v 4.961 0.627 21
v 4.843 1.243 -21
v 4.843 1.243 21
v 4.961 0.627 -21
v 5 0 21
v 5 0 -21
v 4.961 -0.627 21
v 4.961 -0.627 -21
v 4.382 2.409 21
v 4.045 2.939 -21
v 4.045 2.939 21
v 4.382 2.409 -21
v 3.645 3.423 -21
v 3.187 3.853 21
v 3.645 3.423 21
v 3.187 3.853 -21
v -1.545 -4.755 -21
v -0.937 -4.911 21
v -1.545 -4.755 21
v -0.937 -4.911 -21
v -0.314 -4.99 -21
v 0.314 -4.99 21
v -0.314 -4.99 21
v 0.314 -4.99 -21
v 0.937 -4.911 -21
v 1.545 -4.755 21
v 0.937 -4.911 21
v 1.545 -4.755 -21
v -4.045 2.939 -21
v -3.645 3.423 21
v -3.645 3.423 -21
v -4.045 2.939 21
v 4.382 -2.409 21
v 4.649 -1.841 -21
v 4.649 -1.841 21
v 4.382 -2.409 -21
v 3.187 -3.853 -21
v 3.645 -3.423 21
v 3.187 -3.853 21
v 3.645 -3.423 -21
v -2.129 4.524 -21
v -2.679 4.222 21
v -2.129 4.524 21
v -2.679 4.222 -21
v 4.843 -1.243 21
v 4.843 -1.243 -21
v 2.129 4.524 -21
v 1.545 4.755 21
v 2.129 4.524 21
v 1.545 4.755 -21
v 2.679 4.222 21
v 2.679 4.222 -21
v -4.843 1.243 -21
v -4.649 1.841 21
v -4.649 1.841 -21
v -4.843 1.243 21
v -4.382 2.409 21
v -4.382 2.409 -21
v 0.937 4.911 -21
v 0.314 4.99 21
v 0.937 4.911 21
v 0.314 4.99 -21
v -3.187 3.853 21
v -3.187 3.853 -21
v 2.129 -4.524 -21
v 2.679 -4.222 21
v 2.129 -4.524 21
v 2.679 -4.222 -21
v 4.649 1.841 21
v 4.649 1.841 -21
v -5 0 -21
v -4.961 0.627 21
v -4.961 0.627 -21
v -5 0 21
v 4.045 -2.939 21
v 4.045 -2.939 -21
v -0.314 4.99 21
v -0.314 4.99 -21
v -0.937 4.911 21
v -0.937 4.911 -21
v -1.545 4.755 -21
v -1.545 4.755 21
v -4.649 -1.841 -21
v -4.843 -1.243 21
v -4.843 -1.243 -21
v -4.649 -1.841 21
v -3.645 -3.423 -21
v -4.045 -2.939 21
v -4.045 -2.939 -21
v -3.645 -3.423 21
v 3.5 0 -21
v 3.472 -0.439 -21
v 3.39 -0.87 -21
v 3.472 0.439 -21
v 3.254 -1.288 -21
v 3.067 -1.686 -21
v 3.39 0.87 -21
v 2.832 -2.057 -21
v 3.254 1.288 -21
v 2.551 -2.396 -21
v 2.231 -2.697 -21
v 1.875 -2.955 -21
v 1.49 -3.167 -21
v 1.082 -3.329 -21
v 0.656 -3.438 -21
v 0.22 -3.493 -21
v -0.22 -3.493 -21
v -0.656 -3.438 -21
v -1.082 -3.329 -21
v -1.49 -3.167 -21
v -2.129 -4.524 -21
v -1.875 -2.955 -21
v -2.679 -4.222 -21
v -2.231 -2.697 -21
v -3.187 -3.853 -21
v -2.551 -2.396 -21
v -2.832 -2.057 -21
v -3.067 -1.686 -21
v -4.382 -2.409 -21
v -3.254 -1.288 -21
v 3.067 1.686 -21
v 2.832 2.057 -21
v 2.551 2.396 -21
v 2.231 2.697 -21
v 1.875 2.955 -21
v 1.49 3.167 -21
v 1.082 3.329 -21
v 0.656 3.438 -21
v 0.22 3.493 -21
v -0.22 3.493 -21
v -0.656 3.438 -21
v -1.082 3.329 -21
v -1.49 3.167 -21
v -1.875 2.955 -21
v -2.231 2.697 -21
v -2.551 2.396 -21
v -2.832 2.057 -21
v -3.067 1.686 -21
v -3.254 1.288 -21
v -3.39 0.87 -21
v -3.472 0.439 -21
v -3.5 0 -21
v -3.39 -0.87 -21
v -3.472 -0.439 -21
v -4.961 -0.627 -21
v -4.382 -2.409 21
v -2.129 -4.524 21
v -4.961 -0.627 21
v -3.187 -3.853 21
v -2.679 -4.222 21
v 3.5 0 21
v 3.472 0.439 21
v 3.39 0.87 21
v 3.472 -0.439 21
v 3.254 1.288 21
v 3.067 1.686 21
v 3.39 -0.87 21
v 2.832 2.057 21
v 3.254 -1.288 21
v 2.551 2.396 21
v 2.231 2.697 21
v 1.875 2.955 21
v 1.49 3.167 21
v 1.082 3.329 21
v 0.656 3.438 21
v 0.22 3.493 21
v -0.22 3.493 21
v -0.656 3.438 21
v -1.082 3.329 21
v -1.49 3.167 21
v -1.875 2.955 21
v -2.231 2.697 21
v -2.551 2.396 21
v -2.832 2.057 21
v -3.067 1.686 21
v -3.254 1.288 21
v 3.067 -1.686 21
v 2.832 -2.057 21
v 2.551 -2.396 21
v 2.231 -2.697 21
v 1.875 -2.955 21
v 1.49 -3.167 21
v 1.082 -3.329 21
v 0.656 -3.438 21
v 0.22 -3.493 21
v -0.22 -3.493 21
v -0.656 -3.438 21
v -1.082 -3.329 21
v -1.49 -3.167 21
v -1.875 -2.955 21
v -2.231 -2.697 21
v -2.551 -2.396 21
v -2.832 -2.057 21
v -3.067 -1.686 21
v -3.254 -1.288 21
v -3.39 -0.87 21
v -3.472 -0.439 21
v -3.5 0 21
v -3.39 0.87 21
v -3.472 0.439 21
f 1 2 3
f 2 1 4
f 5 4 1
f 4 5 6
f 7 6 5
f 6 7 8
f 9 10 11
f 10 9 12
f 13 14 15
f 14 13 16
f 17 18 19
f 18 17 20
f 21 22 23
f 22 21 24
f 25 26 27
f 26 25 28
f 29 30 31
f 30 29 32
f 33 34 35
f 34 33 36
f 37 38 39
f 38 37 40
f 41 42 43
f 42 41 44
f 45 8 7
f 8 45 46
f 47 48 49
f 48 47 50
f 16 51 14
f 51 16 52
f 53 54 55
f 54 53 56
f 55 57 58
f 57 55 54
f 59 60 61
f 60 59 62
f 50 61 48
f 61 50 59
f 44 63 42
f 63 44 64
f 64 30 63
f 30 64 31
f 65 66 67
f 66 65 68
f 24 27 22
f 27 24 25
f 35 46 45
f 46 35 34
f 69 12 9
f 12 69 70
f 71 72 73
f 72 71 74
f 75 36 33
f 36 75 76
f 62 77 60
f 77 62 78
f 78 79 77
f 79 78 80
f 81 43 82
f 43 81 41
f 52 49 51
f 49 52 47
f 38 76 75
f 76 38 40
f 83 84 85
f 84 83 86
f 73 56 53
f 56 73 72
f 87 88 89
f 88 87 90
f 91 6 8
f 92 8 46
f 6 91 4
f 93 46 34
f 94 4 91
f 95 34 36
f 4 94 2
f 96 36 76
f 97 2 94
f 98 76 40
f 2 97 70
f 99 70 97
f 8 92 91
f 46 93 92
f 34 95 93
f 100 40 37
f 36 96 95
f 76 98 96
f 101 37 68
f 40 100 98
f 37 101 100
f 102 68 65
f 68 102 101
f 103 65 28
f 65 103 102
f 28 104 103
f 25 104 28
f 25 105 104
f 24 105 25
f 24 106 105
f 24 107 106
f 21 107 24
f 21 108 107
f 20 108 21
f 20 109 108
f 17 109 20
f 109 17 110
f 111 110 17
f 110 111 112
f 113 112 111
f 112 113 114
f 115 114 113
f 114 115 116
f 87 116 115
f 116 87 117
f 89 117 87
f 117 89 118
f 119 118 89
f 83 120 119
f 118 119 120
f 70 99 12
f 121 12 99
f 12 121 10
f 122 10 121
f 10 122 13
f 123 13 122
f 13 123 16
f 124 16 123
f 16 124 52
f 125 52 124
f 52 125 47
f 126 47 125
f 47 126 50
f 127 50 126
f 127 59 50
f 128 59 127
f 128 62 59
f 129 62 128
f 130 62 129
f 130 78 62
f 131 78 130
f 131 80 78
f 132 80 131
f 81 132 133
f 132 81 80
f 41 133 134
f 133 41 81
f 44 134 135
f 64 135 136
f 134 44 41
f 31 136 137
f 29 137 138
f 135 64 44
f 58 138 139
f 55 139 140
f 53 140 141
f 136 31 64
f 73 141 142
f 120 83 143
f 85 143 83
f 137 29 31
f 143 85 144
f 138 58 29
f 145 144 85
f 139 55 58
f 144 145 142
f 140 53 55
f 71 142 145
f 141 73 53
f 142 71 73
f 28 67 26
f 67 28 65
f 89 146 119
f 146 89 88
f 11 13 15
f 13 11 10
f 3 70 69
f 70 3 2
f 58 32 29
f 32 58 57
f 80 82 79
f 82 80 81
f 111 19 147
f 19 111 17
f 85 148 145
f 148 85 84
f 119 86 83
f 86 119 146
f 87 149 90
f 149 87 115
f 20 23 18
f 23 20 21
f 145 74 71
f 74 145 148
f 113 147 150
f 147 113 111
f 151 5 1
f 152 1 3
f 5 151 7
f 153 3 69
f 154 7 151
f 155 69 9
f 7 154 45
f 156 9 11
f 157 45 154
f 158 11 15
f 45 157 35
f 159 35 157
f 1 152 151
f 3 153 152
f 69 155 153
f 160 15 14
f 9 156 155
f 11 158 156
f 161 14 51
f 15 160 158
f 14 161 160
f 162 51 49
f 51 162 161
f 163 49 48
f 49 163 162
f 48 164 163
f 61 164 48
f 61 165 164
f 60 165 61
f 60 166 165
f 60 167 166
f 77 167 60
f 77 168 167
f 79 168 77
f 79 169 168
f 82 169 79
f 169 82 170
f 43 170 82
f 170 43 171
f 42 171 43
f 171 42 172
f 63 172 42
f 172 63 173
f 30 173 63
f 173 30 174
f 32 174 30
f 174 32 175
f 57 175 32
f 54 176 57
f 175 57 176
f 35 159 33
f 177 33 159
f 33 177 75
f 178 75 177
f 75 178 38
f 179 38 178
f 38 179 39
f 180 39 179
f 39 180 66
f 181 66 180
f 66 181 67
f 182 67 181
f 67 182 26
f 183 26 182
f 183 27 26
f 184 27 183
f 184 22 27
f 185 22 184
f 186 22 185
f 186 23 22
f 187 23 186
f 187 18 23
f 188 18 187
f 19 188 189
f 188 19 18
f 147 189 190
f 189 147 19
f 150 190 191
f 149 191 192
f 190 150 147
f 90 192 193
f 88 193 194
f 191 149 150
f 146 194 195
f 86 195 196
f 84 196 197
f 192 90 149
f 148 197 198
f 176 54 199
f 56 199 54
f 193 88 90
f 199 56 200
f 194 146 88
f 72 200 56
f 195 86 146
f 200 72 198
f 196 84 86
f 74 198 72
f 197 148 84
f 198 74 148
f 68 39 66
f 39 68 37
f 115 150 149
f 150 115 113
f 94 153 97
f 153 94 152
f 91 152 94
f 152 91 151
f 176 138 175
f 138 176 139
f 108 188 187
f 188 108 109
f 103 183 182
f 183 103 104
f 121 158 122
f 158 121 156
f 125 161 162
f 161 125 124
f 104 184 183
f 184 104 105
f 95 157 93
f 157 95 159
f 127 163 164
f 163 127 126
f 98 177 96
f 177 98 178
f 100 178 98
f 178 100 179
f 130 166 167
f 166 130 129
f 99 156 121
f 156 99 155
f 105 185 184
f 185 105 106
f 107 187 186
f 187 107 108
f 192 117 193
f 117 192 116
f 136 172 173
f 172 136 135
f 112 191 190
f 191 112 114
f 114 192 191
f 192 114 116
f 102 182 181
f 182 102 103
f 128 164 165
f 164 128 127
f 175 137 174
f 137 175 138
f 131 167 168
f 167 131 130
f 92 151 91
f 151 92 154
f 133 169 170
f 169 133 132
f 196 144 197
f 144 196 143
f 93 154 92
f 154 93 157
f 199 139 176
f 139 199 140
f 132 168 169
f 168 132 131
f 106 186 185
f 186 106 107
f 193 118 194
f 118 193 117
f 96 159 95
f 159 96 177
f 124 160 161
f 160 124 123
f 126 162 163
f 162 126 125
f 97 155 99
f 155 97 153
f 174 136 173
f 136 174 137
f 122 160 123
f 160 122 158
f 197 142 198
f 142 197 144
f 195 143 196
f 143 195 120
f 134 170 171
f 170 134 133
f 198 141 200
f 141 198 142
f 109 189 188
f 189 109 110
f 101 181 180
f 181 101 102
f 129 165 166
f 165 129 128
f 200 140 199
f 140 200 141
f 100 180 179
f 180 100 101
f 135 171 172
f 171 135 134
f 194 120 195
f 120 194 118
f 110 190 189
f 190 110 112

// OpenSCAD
$fn = 50;


difference() {
	union() {
		translate(v = [0, 0, -21.0000000000]) {
			cylinder(h = 42, r = 5.0000000000);
		}
	}
	union() {
		translate(v = [0, 0, -100.0000000000]) {
			cylinder(h = 200, r = 3.5000000000);
		}
	}
}
